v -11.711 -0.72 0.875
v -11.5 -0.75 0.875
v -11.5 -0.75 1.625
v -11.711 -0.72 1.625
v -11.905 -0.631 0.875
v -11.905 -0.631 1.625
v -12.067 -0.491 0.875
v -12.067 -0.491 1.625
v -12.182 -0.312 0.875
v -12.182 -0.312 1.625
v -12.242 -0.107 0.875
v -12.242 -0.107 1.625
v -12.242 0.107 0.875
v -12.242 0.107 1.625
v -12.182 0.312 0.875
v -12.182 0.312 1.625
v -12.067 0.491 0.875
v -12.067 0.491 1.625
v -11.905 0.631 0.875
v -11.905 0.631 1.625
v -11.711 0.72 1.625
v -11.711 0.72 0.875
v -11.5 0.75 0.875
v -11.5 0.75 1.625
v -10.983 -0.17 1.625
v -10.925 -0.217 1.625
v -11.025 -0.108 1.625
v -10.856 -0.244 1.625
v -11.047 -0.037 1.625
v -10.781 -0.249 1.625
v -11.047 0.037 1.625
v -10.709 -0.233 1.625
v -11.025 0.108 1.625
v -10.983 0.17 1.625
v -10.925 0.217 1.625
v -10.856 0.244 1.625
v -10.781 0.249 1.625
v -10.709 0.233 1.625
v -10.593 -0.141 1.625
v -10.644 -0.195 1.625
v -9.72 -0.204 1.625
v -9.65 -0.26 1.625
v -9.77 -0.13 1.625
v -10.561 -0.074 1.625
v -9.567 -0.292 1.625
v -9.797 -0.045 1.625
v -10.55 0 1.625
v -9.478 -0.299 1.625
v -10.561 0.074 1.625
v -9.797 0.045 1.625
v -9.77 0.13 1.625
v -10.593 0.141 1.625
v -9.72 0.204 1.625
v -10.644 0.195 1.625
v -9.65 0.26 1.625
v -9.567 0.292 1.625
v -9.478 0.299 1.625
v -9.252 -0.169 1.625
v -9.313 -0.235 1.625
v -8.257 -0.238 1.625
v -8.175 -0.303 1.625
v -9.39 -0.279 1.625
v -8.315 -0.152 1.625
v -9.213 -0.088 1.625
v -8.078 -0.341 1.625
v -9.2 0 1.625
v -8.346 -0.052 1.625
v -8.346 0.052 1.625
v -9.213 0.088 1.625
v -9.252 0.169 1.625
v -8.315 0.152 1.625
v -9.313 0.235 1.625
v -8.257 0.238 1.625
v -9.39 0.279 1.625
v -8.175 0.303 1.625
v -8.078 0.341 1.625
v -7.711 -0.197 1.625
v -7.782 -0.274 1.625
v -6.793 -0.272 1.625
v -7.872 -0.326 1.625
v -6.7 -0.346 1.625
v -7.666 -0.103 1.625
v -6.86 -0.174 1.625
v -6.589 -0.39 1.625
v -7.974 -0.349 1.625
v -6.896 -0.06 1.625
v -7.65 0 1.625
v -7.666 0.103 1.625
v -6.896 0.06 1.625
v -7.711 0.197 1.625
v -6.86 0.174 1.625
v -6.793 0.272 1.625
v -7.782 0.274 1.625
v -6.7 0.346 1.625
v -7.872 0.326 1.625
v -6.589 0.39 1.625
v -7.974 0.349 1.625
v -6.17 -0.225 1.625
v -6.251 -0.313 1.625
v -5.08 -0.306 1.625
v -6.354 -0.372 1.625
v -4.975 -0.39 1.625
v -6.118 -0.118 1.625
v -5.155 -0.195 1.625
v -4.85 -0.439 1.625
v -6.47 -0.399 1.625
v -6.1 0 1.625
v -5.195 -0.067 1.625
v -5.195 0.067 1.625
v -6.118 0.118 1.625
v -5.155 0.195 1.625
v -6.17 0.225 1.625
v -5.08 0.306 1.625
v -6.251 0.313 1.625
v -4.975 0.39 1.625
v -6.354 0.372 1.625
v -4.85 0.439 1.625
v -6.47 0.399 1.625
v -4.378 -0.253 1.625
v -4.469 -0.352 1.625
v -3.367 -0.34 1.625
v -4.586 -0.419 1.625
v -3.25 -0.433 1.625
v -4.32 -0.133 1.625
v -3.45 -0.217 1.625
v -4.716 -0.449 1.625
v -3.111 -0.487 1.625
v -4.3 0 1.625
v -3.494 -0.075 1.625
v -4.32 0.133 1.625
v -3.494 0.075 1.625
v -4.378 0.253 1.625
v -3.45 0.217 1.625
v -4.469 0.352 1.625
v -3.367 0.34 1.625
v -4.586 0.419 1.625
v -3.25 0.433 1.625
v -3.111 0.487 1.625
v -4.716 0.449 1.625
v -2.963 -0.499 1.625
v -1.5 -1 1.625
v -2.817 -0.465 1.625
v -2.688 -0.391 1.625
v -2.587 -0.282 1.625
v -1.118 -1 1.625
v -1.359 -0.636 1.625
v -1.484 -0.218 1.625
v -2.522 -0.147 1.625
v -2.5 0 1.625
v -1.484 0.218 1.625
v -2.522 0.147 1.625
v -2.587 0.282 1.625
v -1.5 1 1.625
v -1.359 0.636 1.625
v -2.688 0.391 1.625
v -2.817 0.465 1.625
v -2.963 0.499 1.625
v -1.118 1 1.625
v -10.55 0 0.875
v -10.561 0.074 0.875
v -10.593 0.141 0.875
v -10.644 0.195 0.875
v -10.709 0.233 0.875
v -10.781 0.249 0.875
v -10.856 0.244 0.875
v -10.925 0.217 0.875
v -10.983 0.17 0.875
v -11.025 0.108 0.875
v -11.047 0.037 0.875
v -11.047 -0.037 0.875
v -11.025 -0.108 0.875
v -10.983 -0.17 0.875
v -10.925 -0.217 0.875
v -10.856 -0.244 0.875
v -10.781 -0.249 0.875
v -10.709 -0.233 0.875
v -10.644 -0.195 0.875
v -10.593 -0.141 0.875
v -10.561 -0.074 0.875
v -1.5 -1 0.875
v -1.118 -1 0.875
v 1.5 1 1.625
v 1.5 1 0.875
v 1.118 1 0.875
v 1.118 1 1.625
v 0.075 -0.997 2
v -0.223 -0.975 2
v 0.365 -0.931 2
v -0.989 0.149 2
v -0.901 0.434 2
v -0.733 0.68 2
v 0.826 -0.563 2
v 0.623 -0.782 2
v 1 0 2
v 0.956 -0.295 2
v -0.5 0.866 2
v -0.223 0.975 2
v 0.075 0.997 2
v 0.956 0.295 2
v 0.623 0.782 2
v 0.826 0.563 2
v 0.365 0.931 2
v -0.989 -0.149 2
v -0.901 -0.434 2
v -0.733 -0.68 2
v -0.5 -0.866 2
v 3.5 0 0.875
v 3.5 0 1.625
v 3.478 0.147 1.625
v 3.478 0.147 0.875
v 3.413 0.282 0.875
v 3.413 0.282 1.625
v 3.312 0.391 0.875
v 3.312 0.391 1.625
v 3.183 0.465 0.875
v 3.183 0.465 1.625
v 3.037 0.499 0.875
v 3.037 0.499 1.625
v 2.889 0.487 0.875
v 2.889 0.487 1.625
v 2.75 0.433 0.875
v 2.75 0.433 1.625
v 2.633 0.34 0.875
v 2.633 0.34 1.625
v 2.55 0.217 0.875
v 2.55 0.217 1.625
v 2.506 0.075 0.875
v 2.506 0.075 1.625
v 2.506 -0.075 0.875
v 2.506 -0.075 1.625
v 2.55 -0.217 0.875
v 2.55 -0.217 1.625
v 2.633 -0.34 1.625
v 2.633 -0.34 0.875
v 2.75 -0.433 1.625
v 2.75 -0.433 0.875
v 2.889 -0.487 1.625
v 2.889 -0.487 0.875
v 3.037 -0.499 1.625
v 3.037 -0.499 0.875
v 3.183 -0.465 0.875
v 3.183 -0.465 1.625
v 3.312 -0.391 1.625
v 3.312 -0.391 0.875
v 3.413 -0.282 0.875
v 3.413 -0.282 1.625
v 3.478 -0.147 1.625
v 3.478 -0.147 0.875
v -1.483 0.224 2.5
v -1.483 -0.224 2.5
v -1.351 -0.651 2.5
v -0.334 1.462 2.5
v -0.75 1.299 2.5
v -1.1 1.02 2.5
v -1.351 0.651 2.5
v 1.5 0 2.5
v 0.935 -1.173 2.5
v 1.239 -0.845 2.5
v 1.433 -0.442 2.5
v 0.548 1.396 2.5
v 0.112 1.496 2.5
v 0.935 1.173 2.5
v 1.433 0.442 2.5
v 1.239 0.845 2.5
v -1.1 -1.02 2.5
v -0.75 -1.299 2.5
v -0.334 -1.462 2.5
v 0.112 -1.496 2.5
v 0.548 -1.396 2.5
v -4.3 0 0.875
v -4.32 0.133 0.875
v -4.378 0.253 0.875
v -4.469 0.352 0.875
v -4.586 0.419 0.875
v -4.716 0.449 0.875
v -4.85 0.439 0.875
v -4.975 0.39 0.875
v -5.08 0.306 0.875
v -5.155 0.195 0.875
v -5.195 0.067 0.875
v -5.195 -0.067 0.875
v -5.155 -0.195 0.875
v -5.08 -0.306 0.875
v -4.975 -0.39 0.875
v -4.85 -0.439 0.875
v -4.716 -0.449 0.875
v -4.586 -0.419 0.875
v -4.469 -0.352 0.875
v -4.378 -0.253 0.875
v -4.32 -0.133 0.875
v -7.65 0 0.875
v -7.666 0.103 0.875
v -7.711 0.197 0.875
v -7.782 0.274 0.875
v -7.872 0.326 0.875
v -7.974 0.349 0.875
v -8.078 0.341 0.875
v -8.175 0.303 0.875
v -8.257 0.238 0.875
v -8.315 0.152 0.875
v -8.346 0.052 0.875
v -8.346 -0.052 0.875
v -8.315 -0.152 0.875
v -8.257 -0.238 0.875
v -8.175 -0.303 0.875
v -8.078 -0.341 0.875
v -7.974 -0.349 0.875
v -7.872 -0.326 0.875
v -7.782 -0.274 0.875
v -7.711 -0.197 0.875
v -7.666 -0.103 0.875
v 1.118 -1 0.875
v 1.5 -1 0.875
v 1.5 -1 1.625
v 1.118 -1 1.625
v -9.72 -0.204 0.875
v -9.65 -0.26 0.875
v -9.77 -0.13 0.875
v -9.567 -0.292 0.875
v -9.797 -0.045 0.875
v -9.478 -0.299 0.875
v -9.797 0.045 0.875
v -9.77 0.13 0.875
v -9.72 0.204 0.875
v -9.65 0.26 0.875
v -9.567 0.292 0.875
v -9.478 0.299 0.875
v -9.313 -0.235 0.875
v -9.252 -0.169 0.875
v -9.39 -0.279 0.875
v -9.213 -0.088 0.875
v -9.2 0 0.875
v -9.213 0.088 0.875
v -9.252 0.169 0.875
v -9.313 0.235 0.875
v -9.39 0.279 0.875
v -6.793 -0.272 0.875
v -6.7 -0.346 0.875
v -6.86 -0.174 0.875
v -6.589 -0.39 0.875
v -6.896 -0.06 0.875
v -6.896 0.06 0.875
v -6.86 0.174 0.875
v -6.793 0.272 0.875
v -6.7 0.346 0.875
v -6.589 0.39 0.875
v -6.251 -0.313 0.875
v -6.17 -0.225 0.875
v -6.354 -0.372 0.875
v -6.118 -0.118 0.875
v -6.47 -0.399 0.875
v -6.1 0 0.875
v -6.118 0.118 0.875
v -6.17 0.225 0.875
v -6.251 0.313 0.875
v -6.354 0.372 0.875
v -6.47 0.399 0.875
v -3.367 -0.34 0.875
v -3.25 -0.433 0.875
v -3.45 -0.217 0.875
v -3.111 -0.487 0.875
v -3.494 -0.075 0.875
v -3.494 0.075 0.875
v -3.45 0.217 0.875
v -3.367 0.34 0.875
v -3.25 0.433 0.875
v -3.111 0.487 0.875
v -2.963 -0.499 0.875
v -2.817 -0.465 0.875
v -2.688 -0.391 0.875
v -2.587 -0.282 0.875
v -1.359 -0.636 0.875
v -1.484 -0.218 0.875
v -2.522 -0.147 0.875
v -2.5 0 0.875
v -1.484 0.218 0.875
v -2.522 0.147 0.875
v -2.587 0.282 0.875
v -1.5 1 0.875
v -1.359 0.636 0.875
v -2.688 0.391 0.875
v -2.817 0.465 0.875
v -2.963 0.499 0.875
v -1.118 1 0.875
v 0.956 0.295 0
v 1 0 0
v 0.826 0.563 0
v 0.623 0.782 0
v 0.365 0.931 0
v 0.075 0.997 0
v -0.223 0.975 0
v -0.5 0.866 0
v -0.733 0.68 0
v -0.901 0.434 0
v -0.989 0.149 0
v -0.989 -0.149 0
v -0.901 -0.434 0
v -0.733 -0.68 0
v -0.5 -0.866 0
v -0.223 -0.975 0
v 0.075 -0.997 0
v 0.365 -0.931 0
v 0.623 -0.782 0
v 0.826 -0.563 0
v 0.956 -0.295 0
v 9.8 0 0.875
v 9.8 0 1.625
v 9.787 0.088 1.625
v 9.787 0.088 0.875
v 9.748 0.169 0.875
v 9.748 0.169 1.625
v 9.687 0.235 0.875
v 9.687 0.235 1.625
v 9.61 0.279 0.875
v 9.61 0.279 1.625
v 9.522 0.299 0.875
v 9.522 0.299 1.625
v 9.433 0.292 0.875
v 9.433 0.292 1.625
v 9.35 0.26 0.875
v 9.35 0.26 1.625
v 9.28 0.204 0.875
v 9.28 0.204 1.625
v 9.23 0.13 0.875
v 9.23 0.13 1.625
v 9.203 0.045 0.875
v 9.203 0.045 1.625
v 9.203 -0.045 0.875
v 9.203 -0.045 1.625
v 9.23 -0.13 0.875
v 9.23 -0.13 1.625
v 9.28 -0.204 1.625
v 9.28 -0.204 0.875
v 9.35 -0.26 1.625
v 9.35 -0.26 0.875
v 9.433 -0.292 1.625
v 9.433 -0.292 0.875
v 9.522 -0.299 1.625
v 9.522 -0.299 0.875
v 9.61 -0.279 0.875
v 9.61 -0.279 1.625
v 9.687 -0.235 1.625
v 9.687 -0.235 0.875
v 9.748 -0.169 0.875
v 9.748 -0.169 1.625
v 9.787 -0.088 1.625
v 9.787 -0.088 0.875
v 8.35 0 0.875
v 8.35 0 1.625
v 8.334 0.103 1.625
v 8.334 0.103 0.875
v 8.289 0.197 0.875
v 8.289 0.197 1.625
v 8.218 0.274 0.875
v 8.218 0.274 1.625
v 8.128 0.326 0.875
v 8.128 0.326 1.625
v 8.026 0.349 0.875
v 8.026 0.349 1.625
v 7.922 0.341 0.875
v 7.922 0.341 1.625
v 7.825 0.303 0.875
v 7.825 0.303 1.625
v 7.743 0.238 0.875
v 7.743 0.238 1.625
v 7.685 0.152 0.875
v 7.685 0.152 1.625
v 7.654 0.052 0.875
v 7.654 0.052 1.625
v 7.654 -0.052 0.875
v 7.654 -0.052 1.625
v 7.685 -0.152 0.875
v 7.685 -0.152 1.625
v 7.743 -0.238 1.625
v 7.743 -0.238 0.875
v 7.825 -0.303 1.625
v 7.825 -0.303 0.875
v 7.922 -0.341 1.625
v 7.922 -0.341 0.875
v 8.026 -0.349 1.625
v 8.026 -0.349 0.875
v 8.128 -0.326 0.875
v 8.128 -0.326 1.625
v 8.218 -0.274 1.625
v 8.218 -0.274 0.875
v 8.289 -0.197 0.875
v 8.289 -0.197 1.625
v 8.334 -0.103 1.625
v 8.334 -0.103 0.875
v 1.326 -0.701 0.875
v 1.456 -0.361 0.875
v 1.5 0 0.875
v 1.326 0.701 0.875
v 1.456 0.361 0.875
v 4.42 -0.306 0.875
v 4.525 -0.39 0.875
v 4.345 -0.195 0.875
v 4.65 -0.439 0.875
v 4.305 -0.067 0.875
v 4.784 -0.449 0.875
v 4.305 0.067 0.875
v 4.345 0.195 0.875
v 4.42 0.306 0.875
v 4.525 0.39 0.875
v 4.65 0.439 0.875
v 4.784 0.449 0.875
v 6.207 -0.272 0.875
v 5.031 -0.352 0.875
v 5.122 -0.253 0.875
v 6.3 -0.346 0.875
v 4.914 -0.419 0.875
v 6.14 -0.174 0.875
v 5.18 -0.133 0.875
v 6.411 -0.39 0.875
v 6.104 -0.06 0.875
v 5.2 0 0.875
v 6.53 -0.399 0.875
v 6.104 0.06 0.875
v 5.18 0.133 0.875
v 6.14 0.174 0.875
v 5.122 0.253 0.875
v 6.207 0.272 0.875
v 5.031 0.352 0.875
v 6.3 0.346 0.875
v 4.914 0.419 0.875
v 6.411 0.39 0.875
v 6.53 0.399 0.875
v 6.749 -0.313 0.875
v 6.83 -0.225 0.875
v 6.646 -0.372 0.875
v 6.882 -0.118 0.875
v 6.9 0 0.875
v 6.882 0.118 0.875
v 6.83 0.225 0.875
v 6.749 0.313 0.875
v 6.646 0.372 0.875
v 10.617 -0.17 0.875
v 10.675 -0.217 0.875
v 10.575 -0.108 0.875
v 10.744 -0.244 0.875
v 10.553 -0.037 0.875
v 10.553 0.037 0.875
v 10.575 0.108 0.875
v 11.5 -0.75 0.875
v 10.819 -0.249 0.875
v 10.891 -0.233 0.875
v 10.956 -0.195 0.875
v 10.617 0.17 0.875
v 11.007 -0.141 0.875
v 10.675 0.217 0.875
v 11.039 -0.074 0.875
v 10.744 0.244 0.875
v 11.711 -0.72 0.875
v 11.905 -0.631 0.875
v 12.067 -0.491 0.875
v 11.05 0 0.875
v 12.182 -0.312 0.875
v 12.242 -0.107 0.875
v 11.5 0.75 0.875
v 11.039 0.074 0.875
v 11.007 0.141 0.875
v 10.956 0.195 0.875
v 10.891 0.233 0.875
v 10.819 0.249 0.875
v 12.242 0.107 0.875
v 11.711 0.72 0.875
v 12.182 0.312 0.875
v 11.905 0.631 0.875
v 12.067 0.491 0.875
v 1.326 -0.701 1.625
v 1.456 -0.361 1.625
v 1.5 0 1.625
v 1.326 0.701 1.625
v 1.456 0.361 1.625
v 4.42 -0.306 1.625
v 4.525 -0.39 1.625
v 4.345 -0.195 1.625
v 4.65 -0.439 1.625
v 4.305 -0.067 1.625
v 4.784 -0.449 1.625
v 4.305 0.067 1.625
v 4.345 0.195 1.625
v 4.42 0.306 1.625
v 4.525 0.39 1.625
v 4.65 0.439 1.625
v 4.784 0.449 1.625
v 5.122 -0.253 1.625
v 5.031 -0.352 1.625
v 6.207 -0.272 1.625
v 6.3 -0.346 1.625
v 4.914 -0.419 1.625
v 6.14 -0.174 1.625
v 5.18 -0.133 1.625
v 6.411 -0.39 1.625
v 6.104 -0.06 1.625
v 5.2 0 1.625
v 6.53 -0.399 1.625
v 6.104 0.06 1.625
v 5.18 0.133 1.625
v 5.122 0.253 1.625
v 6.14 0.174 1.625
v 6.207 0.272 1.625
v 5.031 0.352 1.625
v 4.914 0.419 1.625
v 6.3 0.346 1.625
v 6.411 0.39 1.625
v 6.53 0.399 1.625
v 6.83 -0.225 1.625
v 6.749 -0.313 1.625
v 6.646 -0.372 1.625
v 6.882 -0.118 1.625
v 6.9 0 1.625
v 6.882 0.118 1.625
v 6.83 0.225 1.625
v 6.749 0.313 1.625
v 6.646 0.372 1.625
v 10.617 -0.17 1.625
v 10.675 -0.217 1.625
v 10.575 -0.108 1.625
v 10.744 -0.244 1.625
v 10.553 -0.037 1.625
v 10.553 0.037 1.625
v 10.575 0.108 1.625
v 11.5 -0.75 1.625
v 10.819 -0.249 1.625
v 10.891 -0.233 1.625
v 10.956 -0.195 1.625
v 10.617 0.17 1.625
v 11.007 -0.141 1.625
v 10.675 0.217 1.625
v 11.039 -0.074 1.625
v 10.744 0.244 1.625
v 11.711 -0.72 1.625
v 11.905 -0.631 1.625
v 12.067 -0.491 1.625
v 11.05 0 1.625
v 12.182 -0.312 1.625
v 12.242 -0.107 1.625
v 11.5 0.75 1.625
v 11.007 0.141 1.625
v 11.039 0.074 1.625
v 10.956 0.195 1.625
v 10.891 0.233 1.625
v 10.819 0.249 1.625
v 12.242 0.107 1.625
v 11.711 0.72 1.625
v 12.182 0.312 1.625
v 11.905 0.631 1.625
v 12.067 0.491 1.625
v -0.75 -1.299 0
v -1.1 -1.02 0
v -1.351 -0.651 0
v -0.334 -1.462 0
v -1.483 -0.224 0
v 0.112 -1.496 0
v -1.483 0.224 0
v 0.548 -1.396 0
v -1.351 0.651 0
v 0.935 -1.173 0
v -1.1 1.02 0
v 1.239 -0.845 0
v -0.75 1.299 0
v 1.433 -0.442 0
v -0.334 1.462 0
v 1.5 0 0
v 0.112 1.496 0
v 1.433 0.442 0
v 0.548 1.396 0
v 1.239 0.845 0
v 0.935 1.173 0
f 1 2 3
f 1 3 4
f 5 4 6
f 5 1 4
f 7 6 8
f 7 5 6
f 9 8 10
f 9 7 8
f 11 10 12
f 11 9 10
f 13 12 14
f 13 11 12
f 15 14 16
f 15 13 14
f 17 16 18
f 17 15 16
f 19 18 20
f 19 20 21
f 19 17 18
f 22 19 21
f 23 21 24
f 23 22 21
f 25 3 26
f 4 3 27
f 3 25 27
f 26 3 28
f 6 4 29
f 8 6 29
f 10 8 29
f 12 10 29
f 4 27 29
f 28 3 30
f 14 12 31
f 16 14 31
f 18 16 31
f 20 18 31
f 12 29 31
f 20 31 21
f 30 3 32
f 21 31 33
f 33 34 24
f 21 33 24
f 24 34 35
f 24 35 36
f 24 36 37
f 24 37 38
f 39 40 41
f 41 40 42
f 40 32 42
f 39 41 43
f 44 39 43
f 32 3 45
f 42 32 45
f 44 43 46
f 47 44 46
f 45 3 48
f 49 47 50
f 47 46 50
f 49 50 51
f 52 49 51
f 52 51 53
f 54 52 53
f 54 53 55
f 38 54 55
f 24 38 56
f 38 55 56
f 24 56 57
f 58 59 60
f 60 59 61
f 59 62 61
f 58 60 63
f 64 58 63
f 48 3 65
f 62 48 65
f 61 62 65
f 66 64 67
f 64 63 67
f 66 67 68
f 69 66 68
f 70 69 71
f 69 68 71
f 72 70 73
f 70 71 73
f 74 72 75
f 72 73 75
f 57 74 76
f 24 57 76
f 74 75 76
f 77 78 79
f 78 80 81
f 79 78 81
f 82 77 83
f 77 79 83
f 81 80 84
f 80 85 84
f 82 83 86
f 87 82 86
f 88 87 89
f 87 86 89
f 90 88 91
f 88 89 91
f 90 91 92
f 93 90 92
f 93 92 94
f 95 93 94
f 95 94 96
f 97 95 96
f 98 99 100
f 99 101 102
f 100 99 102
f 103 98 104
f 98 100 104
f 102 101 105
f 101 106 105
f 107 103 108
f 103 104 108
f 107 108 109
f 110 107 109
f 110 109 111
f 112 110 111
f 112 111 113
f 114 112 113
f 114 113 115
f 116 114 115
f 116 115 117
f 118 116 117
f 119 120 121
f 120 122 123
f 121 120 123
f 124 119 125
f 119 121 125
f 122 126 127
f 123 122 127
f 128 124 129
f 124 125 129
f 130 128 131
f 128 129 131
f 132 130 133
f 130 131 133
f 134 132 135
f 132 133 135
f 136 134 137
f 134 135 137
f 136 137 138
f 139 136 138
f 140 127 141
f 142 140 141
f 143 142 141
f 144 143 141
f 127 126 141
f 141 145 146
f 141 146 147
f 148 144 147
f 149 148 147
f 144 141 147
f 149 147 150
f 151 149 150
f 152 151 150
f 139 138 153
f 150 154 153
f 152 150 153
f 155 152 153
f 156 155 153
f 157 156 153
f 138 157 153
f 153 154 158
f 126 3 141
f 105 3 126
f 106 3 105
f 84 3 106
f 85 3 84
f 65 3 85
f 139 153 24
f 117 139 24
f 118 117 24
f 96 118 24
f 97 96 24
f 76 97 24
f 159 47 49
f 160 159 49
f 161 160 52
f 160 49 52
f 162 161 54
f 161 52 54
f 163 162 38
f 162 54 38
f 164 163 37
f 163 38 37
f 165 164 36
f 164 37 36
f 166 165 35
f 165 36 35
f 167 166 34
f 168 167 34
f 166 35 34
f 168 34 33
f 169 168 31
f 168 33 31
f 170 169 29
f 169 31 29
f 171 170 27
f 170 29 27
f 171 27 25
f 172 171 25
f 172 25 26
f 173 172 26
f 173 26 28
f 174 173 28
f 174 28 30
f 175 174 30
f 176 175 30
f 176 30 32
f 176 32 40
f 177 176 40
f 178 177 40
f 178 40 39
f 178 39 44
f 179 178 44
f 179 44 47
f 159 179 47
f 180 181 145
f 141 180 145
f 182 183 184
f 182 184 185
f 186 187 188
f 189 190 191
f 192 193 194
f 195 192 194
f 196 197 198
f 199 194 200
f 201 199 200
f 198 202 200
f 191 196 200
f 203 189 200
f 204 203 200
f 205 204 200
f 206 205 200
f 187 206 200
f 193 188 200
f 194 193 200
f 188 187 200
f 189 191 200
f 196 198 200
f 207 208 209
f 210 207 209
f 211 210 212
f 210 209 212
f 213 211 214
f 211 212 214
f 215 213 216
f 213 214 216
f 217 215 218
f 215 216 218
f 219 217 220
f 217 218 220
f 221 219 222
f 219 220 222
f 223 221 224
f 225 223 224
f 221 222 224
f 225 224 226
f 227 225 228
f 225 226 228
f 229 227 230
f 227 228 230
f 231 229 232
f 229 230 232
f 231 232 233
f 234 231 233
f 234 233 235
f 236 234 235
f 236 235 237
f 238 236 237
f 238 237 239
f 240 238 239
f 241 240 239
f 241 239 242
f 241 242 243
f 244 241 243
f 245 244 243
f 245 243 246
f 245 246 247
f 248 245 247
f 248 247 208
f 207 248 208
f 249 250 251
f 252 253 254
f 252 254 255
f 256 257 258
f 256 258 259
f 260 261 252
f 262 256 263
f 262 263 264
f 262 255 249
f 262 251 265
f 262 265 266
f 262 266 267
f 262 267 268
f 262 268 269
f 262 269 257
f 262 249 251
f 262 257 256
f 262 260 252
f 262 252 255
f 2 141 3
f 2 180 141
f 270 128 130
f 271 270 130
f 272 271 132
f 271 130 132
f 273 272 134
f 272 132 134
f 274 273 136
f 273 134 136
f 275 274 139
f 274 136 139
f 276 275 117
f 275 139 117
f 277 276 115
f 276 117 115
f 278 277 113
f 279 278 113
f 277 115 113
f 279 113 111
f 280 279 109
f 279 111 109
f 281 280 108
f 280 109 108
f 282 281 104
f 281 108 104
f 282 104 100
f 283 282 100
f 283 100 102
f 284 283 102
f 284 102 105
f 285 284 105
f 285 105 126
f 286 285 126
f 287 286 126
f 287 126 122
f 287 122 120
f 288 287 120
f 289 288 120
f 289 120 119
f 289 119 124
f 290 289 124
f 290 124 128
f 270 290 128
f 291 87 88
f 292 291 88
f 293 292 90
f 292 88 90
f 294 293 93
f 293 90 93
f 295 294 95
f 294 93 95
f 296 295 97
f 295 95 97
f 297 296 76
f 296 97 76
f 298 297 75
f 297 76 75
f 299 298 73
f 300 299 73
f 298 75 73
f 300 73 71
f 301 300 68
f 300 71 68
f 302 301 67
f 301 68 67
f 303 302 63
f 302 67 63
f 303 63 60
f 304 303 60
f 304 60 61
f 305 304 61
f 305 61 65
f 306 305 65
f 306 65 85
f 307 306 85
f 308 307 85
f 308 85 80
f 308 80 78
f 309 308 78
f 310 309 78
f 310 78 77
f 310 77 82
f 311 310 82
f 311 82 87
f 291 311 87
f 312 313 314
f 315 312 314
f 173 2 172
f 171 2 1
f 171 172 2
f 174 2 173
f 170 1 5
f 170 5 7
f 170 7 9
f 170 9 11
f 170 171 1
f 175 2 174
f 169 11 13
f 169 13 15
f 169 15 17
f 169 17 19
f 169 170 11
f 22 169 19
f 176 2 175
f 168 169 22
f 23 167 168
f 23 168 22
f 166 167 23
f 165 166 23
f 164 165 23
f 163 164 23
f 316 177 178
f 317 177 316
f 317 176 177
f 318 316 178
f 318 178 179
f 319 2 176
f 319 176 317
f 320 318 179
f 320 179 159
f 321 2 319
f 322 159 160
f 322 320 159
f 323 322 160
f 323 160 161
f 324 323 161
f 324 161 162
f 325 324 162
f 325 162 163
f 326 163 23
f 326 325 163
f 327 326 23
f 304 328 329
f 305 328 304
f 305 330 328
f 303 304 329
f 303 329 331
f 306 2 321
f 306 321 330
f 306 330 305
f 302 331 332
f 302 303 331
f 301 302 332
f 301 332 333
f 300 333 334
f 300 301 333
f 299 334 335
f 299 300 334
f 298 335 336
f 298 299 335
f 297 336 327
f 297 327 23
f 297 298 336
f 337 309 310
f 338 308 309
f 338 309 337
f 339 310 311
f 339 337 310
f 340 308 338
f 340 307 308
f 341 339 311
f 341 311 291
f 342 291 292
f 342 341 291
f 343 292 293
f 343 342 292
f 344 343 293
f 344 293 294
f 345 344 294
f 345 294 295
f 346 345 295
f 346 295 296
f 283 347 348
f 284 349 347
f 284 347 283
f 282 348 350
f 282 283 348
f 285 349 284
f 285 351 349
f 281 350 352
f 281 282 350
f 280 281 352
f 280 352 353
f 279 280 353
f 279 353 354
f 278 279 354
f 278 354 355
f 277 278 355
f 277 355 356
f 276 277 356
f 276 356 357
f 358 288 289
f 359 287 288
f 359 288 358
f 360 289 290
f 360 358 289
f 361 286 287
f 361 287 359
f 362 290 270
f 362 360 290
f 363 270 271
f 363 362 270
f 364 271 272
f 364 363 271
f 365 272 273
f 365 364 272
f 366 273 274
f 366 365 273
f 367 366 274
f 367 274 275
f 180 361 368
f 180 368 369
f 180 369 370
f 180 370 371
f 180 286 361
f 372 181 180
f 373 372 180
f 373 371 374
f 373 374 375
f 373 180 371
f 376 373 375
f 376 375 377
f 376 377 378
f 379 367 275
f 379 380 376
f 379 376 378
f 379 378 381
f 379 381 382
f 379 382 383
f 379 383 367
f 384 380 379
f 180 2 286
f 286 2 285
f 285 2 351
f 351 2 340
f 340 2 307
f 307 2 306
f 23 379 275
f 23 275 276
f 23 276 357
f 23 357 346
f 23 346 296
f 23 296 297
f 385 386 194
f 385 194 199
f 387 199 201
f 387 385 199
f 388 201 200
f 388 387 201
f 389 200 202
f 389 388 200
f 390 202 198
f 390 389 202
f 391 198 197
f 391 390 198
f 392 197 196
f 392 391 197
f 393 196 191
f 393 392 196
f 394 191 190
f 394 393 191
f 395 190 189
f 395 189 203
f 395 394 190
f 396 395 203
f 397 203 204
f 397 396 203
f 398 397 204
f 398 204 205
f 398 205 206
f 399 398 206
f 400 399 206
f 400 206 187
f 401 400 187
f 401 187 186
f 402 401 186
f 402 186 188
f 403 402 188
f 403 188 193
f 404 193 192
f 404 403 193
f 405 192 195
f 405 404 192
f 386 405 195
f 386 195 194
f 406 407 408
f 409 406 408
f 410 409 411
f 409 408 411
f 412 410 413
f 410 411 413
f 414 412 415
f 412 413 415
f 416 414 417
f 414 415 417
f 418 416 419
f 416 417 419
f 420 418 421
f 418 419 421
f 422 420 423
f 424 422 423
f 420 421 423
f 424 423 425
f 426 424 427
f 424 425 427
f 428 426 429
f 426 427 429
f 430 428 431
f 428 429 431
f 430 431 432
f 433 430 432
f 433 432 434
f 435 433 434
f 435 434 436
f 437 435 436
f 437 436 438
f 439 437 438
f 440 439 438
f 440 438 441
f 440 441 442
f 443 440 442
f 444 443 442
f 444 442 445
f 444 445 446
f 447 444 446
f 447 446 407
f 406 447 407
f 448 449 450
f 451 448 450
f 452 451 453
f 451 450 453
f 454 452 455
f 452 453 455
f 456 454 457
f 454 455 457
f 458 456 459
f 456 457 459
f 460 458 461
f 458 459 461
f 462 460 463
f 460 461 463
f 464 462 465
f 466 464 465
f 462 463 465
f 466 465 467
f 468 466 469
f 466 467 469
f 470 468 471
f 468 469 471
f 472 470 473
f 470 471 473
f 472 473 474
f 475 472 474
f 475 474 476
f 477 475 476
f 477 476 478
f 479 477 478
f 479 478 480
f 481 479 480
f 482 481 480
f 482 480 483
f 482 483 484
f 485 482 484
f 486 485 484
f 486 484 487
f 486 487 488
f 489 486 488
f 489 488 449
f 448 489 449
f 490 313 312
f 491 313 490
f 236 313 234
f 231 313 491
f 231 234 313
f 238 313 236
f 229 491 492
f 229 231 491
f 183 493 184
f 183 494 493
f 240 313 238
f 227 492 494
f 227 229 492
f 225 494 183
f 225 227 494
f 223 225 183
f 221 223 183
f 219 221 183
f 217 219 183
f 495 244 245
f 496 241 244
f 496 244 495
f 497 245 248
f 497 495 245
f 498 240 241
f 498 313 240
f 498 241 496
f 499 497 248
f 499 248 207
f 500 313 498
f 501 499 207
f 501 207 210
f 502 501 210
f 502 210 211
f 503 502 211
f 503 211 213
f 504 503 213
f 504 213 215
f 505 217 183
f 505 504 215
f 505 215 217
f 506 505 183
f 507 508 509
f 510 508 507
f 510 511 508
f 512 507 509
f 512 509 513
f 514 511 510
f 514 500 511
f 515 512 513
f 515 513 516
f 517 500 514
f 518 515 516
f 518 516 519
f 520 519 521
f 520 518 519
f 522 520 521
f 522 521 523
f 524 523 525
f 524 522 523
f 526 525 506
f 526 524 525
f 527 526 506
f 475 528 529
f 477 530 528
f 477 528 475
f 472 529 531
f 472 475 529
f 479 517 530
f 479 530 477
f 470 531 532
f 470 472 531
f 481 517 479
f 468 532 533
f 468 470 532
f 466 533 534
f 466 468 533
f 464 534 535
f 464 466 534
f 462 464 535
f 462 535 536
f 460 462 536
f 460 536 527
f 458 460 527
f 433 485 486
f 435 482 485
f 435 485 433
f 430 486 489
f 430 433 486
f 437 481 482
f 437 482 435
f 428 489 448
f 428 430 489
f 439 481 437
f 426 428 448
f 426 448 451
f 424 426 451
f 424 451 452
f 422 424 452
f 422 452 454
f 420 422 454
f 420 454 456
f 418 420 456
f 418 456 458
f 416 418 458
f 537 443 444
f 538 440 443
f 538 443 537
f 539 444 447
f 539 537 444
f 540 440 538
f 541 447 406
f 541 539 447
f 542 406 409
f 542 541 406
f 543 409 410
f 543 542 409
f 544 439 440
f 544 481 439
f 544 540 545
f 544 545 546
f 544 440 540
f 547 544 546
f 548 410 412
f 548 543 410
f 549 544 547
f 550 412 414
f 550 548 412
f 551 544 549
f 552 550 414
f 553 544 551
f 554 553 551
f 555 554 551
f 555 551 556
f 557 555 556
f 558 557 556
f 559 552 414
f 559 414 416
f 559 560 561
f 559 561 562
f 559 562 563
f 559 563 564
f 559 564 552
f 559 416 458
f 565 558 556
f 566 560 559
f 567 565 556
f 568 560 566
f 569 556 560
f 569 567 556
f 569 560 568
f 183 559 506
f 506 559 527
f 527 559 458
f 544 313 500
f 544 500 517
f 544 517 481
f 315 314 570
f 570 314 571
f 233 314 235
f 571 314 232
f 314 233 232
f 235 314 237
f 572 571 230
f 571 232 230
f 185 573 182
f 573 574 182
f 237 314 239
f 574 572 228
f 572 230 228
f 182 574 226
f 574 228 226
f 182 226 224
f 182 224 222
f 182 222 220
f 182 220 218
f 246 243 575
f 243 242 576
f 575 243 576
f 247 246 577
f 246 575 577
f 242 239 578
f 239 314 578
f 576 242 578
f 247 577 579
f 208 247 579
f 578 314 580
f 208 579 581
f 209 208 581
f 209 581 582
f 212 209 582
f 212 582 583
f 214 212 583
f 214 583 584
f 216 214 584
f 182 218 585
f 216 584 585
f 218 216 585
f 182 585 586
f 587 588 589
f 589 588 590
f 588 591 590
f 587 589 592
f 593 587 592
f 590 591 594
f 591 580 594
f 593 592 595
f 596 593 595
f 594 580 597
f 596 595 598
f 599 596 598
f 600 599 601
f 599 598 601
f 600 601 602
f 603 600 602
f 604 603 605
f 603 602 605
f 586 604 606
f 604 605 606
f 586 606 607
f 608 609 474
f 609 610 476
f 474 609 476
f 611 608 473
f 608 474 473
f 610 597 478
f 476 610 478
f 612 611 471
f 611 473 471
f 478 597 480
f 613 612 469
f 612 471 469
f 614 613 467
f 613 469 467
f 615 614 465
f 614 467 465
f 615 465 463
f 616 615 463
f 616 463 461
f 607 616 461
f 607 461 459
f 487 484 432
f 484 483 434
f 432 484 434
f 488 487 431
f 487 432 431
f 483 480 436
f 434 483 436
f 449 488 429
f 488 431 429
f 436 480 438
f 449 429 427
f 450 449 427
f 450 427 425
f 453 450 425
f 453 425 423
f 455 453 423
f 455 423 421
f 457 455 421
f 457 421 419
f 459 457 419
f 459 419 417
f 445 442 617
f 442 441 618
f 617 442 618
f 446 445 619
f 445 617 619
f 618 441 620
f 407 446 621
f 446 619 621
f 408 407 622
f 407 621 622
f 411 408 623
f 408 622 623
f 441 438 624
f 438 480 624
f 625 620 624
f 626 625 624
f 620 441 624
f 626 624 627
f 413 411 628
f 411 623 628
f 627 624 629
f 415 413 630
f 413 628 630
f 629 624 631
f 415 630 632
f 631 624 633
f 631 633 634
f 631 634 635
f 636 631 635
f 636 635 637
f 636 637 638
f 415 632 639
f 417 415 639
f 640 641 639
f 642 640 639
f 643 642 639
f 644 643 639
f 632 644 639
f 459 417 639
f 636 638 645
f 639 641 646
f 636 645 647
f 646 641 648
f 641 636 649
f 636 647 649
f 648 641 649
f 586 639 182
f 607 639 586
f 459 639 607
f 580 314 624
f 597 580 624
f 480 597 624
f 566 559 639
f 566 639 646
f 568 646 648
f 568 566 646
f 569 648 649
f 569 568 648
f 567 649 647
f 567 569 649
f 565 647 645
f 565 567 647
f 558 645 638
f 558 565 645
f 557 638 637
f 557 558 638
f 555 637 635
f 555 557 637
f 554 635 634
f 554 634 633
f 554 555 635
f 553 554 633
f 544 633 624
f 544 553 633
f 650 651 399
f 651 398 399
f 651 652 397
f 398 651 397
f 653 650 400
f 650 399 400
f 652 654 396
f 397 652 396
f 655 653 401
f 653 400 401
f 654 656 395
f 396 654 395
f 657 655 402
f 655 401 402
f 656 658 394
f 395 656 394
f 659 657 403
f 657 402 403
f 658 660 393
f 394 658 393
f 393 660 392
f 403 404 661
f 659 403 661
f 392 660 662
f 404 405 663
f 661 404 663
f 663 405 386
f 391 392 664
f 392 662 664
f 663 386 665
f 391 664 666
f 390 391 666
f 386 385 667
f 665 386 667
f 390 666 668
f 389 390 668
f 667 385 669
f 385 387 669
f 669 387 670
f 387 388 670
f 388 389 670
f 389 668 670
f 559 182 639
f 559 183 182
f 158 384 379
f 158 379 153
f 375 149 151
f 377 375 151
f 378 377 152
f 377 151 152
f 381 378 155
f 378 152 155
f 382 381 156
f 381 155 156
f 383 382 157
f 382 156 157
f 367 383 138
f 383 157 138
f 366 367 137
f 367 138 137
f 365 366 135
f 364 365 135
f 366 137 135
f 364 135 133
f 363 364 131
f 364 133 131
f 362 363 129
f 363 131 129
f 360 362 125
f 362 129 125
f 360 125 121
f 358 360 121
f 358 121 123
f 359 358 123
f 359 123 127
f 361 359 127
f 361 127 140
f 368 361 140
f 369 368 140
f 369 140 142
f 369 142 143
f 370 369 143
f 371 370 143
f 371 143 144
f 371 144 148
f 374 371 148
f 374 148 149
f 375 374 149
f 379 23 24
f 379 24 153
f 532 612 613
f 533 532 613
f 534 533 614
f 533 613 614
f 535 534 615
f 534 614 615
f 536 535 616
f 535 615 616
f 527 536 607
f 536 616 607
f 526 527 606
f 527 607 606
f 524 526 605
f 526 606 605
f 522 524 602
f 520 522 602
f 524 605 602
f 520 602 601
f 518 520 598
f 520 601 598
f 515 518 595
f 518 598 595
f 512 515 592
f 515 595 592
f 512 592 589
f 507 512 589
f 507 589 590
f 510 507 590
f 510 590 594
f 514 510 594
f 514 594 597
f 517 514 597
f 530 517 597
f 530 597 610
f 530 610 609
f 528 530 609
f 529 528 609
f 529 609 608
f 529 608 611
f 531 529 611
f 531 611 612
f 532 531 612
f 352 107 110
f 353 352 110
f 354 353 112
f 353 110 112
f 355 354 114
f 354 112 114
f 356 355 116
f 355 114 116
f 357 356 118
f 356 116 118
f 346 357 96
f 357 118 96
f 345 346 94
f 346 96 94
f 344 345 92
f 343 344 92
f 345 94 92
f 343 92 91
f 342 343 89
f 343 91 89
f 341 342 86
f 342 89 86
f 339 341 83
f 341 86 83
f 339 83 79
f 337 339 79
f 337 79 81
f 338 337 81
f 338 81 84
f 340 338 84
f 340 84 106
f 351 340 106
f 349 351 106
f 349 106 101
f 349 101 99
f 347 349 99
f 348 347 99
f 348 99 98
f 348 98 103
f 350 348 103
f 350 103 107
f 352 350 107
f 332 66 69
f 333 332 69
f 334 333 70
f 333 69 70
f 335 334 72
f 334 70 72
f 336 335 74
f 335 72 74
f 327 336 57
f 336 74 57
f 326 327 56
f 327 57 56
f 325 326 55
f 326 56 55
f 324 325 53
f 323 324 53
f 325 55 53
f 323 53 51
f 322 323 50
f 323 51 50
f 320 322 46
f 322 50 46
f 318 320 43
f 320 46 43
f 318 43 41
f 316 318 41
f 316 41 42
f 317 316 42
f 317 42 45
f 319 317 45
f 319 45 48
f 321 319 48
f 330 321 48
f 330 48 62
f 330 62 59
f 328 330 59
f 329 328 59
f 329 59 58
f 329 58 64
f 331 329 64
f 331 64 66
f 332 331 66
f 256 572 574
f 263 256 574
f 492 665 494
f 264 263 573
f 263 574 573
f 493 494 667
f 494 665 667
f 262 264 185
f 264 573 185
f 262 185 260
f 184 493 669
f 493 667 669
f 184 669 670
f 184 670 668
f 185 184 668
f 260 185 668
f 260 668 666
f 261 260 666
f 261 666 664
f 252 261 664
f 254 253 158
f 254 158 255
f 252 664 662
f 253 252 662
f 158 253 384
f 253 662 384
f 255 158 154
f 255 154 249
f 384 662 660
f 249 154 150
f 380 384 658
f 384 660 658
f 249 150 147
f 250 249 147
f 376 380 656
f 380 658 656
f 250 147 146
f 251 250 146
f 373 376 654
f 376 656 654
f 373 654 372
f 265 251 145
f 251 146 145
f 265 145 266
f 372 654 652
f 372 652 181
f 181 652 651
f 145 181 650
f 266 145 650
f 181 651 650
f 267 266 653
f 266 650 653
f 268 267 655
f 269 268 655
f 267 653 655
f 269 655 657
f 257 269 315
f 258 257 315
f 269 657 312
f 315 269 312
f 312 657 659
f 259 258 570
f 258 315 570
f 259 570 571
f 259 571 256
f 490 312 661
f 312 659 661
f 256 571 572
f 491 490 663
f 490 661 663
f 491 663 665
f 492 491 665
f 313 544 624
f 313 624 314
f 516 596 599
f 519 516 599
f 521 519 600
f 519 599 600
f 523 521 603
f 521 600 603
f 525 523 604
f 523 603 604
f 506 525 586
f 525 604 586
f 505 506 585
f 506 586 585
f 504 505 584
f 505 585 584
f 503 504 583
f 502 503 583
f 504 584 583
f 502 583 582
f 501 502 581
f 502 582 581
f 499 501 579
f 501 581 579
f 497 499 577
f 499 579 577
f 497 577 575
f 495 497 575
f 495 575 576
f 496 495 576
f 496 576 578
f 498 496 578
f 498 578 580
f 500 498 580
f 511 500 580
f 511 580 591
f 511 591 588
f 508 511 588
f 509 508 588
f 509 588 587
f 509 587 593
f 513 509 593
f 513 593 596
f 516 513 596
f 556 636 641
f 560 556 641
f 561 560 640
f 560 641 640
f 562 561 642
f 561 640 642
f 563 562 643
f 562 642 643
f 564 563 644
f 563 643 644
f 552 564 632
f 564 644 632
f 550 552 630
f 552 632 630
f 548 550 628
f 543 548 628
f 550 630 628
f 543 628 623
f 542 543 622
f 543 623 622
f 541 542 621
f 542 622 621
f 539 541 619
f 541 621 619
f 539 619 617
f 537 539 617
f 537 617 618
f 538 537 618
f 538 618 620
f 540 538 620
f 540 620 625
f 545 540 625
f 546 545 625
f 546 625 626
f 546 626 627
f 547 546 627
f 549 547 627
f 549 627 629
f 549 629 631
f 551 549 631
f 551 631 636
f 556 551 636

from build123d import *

# Parameters (mm, degrees)
SKETCH1_R                  = 1.5
BOSS_EXTRUDE1_DEPTH        = 2.5
SKETCH1_3_R                = 1
CUT_EXTRUDE1_DEPTH         = 2
BOSS_EXTRUDE2_DEPTH        = 0.375
BOSS_EXTRUDE2_DEPTH_BACK   = 0.375
BOSS_EXTRUDE2_2_DEPTH      = 0.375
BOSS_EXTRUDE2_2_DEPTH_BACK = 0.375
BOSS_EXTRUDE3_START        = -0.381966
SKETCH2_W                  = 0.75
SKETCH2_H                  = 2
BOSS_EXTRUDE3_DEPTH        = 0.381966
SKETCH4_W                  = 0.75
SKETCH4_H                  = 2
BOSS_EXTRUDE4_DEPTH        = 0.381966
CUT_EXTRUDE2_REACH         = 3.625
SKETCH5_R                  = 0.25
SKETCH5_R_2                = 0.3
SKETCH5_R_3                = 0.35
SKETCH5_R_4                = 0.4
SKETCH5_R_5                = 0.45
SKETCH5_R_6                = 0.5


with BuildPart() as part:
    # Sketch1 → Boss-Extrude1 (new body)
    with BuildSketch(Plane.XY):
        Circle(SKETCH1_R)
    extrude(amount=BOSS_EXTRUDE1_DEPTH)

    # Sketch1<3> → Cut-Extrude1 (cut)
    with BuildSketch(Plane.XY):
        Circle(SKETCH1_3_R)
    extrude(amount=CUT_EXTRUDE1_DEPTH, mode=Mode.SUBTRACT)



with BuildPart() as body_2:
    # Sketch3 → Boss-Extrude2 (new body, two sides)
    with BuildSketch(Plane(origin=(0, 0, 1.25), x_dir=(0, -1, 0), z_dir=(0, 0, -1))) as boss_extrude2_sk:
        with BuildLine():
            Line((1, 1.5), (0.75, 11.5))
            ThreePointArc((0.75, 11.5), (0, 12.25), (-0.75, 11.5))
            Line((-0.75, 11.5), (-1, 1.5))
            Line((-1, 1.5), (1, 1.5))
        make_face()
    extrude(amount=BOSS_EXTRUDE2_DEPTH)
    extrude(boss_extrude2_sk.sketch, amount=-BOSS_EXTRUDE2_DEPTH_BACK)


with BuildPart() as body_3:
    # Sketch3 → Boss-Extrude2 2 (new body, two sides)
    with BuildSketch(Plane(origin=(0, 0, 1.25), x_dir=(0, -1, 0), z_dir=(0, 0, -1))) as boss_extrude2_2_sk:
        with BuildLine():
            Line((-1, -1.5), (-0.75, -11.5))
            ThreePointArc((-0.75, -11.5), (0, -12.25), (0.75, -11.5))
            Line((0.75, -11.5), (1, -1.5))
            Line((1, -1.5), (-1, -1.5))
        make_face()
    extrude(amount=BOSS_EXTRUDE2_2_DEPTH)
    extrude(boss_extrude2_2_sk.sketch, amount=-BOSS_EXTRUDE2_2_DEPTH_BACK)


with BuildPart() as part_1:
    add(part.part)

    add(body_2.part)  # Boss-Extrude3 merges body 2
    # Sketch2 → Boss-Extrude3 (add)
    with BuildSketch(Plane.ZY.offset(1.5).offset(BOSS_EXTRUDE3_START)):
        with Locations((1.25, 0)):
            Rectangle(SKETCH2_W, SKETCH2_H)
    extrude(amount=BOSS_EXTRUDE3_DEPTH)


    add(body_3.part)  # Boss-Extrude4 merges body 3
    # Sketch4 → Boss-Extrude4 (add)
    with BuildSketch(Plane.ZY.offset(-1.5)):
        with Locations((1.25, 0)):
            Rectangle(SKETCH4_W, SKETCH4_H)
    extrude(amount=BOSS_EXTRUDE4_DEPTH)

    # Sketch5 → Cut-Extrude2 (cut, up to next)
    with BuildSketch(Plane.XY.offset(1.625), mode=Mode.PRIVATE) as cut_extrude2_sk1:
        with Locations((-10.8, 0)):
            Circle(SKETCH5_R)
    cut_extrude2_tool1 = extrude(cut_extrude2_sk1.sketch, amount=-CUT_EXTRUDE2_REACH, mode=Mode.PRIVATE) & part_1.part
    add(cut_extrude2_tool1.solids().sort_by_distance((-10.8, 0, 1.625))[0], mode=Mode.SUBTRACT)
    # Sketch5 → Cut-Extrude2 (cut, up to next)
    with BuildSketch(Plane.XY.offset(1.625), mode=Mode.PRIVATE) as cut_extrude2_sk2:
        with Locations((-9.5, 0)):
            Circle(SKETCH5_R_2)
    cut_extrude2_tool2 = extrude(cut_extrude2_sk2.sketch, amount=-CUT_EXTRUDE2_REACH, mode=Mode.PRIVATE) & part_1.part
    add(cut_extrude2_tool2.solids().sort_by_distance((-9.5, 0, 1.625))[0], mode=Mode.SUBTRACT)
    # Sketch5 → Cut-Extrude2 (cut, up to next)
    with BuildSketch(Plane.XY.offset(1.625), mode=Mode.PRIVATE) as cut_extrude2_sk3:
        with Locations((-8, 0)):
            Circle(SKETCH5_R_3)
    cut_extrude2_tool3 = extrude(cut_extrude2_sk3.sketch, amount=-CUT_EXTRUDE2_REACH, mode=Mode.PRIVATE) & part_1.part
    add(cut_extrude2_tool3.solids().sort_by_distance((-8, 0, 1.625))[0], mode=Mode.SUBTRACT)
    # Sketch5 → Cut-Extrude2 (cut, up to next)
    with BuildSketch(Plane.XY.offset(1.625), mode=Mode.PRIVATE) as cut_extrude2_sk4:
        with Locations((-6.5, 0)):
            Circle(SKETCH5_R_4)
    cut_extrude2_tool4 = extrude(cut_extrude2_sk4.sketch, amount=-CUT_EXTRUDE2_REACH, mode=Mode.PRIVATE) & part_1.part
    add(cut_extrude2_tool4.solids().sort_by_distance((-6.5, 0, 1.625))[0], mode=Mode.SUBTRACT)
    # Sketch5 → Cut-Extrude2 (cut, up to next)
    with BuildSketch(Plane.XY.offset(1.625), mode=Mode.PRIVATE) as cut_extrude2_sk5:
        with Locations((-4.75, 0)):
            Circle(SKETCH5_R_5)
    cut_extrude2_tool5 = extrude(cut_extrude2_sk5.sketch, amount=-CUT_EXTRUDE2_REACH, mode=Mode.PRIVATE) & part_1.part
    add(cut_extrude2_tool5.solids().sort_by_distance((-4.75, 0, 1.625))[0], mode=Mode.SUBTRACT)
    # Sketch5 → Cut-Extrude2 (cut, up to next)
    with BuildSketch(Plane.XY.offset(1.625), mode=Mode.PRIVATE) as cut_extrude2_sk6:
        with Locations((-3, 0)):
            Circle(SKETCH5_R_6)
    cut_extrude2_tool6 = extrude(cut_extrude2_sk6.sketch, amount=-CUT_EXTRUDE2_REACH, mode=Mode.PRIVATE) & part_1.part
    add(cut_extrude2_tool6.solids().sort_by_distance((-3, 0, 1.625))[0], mode=Mode.SUBTRACT)
    # Sketch5 → Cut-Extrude2 (cut, up to next)
    with BuildSketch(Plane.XY.offset(1.625), mode=Mode.PRIVATE) as cut_extrude2_sk7:
        with Locations((3, 0)):
            Circle(SKETCH5_R_6)
    cut_extrude2_tool7 = extrude(cut_extrude2_sk7.sketch, amount=-CUT_EXTRUDE2_REACH, mode=Mode.PRIVATE) & part_1.part
    add(cut_extrude2_tool7.solids().sort_by_distance((3, 0, 1.625))[0], mode=Mode.SUBTRACT)
    # Sketch5 → Cut-Extrude2 (cut, up to next)
    with BuildSketch(Plane.XY.offset(1.625), mode=Mode.PRIVATE) as cut_extrude2_sk8:
        with Locations((4.75, 0)):
            Circle(SKETCH5_R_5)
    cut_extrude2_tool8 = extrude(cut_extrude2_sk8.sketch, amount=-CUT_EXTRUDE2_REACH, mode=Mode.PRIVATE) & part_1.part
    add(cut_extrude2_tool8.solids().sort_by_distance((4.75, 0, 1.625))[0], mode=Mode.SUBTRACT)
    # Sketch5 → Cut-Extrude2 (cut, up to next)
    with BuildSketch(Plane.XY.offset(1.625), mode=Mode.PRIVATE) as cut_extrude2_sk9:
        with Locations((6.5, 0)):
            Circle(SKETCH5_R_4)
    cut_extrude2_tool9 = extrude(cut_extrude2_sk9.sketch, amount=-CUT_EXTRUDE2_REACH, mode=Mode.PRIVATE) & part_1.part
    add(cut_extrude2_tool9.solids().sort_by_distance((6.5, 0, 1.625))[0], mode=Mode.SUBTRACT)
    # Sketch5 → Cut-Extrude2 (cut, up to next)
    with BuildSketch(Plane.XY.offset(1.625), mode=Mode.PRIVATE) as cut_extrude2_sk10:
        with Locations((8, 0)):
            Circle(SKETCH5_R_3)
    cut_extrude2_tool10 = extrude(cut_extrude2_sk10.sketch, amount=-CUT_EXTRUDE2_REACH, mode=Mode.PRIVATE) & part_1.part
    add(cut_extrude2_tool10.solids().sort_by_distance((8, 0, 1.625))[0], mode=Mode.SUBTRACT)
    # Sketch5 → Cut-Extrude2 (cut, up to next)
    with BuildSketch(Plane.XY.offset(1.625), mode=Mode.PRIVATE) as cut_extrude2_sk11:
        with Locations((9.5, 0)):
            Circle(SKETCH5_R_2)
    cut_extrude2_tool11 = extrude(cut_extrude2_sk11.sketch, amount=-CUT_EXTRUDE2_REACH, mode=Mode.PRIVATE) & part_1.part
    add(cut_extrude2_tool11.solids().sort_by_distance((9.5, 0, 1.625))[0], mode=Mode.SUBTRACT)
    # Sketch5 → Cut-Extrude2 (cut, up to next)
    with BuildSketch(Plane.XY.offset(1.625), mode=Mode.PRIVATE) as cut_extrude2_sk12:
        with Locations((10.8, 0)):
            Circle(SKETCH5_R)
    cut_extrude2_tool12 = extrude(cut_extrude2_sk12.sketch, amount=-CUT_EXTRUDE2_REACH, mode=Mode.PRIVATE) & part_1.part
    add(cut_extrude2_tool12.solids().sort_by_distance((10.8, 0, 1.625))[0], mode=Mode.SUBTRACT)


solid = part_1.part
